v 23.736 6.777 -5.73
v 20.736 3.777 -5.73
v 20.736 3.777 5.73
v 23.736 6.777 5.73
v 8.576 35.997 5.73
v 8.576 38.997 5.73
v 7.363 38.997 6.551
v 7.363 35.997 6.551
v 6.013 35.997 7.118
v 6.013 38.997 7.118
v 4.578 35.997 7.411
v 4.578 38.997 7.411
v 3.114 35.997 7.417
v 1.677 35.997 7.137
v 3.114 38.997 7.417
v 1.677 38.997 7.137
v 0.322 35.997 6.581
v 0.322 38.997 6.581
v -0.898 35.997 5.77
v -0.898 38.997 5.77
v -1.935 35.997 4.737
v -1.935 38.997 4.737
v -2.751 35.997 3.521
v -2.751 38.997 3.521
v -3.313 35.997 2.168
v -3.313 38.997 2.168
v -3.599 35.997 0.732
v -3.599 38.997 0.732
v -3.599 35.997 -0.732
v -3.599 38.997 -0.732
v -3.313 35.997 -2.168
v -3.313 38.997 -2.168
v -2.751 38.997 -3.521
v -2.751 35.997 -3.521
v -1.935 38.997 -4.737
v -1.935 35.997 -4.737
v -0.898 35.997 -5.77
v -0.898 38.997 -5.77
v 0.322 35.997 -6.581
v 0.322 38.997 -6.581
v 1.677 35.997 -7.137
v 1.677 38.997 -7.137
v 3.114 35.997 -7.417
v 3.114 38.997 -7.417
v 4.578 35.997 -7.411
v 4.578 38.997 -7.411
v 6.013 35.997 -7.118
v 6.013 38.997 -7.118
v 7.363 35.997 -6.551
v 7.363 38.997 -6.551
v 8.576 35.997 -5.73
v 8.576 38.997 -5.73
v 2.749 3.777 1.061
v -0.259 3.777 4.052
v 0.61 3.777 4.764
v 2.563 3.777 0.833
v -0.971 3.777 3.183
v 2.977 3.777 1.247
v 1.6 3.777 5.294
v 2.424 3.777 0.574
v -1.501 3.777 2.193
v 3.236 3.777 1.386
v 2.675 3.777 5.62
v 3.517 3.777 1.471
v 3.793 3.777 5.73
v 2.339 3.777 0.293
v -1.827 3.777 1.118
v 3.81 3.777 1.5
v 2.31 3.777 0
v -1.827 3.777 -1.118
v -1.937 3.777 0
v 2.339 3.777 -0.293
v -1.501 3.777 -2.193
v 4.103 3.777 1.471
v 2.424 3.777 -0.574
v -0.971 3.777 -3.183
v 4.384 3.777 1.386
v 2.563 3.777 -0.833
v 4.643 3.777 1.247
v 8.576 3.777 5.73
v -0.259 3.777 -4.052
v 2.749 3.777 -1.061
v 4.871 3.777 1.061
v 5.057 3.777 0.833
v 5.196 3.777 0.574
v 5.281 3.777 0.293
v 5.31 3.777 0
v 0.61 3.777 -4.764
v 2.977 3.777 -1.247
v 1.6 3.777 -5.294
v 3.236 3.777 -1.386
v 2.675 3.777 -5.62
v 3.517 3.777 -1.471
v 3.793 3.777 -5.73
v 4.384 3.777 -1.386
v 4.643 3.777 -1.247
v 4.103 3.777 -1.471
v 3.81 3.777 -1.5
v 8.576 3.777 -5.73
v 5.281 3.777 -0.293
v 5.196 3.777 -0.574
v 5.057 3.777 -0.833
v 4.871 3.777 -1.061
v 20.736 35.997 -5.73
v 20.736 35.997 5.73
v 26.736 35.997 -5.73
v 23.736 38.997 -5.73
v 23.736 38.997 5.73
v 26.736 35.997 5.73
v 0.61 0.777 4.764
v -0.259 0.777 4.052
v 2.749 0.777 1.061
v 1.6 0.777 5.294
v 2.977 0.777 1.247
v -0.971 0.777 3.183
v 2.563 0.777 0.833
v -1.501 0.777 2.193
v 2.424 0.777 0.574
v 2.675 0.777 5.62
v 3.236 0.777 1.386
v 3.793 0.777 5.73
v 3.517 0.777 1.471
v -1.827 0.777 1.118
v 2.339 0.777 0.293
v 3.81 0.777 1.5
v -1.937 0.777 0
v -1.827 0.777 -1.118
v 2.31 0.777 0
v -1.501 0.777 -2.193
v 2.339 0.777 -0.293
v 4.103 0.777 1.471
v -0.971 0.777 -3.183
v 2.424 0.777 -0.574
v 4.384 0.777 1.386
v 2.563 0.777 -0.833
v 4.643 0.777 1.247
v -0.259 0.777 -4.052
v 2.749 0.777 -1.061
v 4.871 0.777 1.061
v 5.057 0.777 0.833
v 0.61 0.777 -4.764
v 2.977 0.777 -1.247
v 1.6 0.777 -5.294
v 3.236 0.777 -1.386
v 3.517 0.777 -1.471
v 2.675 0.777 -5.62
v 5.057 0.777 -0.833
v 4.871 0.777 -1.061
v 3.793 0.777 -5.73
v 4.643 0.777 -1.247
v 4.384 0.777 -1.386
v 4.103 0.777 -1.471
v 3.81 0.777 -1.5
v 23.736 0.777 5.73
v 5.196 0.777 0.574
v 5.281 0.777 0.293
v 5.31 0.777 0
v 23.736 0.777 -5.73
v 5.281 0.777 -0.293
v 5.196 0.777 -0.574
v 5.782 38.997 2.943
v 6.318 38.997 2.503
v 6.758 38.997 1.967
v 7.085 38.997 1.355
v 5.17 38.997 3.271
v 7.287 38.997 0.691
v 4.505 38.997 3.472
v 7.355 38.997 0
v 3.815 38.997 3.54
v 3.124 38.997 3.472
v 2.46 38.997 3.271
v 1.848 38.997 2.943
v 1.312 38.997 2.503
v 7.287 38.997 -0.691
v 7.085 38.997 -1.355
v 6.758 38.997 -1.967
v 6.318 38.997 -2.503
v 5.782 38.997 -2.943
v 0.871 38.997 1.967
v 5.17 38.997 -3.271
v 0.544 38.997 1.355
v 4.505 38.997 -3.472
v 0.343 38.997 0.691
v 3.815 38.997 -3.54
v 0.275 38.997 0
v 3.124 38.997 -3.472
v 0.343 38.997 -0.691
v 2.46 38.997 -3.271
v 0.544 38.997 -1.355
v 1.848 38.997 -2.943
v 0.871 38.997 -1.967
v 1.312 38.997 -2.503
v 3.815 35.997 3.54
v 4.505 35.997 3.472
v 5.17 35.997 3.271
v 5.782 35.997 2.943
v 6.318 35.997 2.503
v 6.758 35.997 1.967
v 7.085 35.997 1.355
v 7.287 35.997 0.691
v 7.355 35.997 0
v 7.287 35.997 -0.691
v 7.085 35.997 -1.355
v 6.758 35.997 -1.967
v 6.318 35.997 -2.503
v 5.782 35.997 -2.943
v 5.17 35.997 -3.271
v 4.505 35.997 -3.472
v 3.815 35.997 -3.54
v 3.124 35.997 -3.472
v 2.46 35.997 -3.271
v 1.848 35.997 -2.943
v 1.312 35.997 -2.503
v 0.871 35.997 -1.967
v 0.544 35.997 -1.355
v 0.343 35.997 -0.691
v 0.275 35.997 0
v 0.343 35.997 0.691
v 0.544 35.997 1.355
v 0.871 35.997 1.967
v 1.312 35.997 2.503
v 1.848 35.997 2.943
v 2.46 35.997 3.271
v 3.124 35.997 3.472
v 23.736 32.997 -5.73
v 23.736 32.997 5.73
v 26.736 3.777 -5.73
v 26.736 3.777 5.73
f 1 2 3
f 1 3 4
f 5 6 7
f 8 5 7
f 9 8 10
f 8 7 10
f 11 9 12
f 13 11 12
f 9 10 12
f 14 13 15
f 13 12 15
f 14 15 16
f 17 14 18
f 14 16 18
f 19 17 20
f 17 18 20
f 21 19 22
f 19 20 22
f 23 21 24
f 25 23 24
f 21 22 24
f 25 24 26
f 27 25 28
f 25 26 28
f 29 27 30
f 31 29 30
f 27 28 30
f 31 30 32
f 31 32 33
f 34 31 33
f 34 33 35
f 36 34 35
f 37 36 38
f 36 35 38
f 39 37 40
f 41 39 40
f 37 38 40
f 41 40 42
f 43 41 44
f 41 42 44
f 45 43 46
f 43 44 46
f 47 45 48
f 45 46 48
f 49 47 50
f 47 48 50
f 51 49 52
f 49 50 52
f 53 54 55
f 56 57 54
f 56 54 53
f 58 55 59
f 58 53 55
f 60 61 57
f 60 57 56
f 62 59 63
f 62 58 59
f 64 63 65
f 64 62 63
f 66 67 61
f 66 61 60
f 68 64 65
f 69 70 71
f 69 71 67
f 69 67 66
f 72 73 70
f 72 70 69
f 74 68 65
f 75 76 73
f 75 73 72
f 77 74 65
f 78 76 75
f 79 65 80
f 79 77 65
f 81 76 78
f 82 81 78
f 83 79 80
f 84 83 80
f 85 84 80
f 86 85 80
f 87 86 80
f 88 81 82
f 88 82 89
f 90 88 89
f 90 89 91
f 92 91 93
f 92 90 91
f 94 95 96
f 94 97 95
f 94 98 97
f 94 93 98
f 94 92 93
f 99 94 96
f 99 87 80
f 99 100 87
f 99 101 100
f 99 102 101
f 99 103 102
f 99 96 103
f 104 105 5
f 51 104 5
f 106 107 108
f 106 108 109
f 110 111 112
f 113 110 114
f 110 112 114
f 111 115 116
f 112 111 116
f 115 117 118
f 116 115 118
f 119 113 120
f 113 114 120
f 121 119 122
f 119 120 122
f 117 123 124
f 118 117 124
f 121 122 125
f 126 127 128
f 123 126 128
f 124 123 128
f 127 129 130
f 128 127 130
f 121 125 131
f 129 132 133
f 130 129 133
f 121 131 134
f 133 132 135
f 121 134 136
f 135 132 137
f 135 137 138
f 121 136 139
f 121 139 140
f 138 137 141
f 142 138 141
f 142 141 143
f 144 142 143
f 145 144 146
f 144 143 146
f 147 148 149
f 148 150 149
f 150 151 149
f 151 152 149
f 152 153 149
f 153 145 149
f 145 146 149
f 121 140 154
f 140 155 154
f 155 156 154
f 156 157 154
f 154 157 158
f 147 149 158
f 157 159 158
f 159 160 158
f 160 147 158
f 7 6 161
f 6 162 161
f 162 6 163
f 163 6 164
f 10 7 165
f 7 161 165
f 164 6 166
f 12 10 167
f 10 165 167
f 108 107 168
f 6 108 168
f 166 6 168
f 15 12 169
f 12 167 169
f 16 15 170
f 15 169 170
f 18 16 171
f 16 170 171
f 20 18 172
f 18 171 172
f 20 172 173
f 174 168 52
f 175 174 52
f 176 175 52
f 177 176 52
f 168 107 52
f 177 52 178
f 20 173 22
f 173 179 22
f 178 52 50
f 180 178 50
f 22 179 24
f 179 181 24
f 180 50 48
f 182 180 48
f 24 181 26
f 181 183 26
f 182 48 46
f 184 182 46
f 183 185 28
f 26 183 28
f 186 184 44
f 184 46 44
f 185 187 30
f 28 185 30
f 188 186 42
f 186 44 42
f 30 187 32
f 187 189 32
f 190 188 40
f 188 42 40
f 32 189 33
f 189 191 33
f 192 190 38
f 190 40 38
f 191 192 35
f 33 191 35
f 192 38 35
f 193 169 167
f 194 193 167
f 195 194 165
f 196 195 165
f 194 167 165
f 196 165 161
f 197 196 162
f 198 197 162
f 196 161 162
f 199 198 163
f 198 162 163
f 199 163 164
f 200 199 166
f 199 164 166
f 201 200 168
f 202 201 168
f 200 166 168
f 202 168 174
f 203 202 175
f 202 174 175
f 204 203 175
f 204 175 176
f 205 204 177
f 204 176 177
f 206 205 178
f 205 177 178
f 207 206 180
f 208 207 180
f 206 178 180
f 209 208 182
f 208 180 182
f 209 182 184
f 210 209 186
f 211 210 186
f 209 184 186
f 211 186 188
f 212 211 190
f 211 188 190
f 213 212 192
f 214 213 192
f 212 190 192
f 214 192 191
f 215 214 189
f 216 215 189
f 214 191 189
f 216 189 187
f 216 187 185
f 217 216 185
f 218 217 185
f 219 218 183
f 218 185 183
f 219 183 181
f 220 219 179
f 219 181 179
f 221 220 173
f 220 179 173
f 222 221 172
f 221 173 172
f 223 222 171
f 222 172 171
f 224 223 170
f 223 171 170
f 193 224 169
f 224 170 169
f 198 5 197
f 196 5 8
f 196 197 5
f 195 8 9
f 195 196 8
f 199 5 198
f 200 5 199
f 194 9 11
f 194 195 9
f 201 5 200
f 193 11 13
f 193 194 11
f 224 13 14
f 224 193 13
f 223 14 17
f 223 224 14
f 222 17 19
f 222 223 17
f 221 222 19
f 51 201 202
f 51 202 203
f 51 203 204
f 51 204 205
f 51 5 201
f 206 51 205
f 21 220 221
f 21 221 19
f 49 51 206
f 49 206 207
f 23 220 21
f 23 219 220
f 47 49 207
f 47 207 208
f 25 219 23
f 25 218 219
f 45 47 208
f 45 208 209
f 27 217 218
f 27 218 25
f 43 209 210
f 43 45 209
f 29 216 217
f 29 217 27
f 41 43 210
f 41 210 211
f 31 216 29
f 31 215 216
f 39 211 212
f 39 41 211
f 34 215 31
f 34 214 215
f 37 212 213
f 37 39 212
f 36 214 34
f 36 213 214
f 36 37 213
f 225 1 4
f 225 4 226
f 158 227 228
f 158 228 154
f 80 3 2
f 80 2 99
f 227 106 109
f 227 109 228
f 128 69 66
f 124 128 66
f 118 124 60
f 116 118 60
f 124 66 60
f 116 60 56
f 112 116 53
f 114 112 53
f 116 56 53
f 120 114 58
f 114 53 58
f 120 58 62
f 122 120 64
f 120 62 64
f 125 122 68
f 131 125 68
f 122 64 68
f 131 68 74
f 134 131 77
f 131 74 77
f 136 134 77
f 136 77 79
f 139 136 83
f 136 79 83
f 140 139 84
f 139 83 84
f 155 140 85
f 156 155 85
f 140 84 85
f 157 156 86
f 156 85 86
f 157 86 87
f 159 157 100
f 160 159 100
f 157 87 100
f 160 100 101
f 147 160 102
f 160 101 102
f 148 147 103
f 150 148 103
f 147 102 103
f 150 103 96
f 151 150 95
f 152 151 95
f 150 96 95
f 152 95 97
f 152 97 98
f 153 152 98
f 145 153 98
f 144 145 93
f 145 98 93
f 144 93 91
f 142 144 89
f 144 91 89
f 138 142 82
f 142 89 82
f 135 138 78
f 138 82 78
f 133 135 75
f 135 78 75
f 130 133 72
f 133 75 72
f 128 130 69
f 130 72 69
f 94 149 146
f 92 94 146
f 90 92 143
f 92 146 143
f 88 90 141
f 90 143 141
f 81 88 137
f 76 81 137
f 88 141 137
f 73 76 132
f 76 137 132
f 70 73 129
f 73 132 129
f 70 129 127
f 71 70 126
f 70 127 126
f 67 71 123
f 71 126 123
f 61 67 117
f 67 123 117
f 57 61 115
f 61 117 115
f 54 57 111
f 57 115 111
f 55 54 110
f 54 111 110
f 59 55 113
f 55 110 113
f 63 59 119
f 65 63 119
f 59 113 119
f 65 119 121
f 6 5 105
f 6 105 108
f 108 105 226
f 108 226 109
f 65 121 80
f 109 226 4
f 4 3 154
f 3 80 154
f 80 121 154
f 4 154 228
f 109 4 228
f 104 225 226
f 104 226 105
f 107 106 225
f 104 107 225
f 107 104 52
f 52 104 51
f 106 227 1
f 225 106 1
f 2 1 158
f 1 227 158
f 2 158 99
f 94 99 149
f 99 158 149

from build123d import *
from OCP.BRepAlgoAPI import BRepAlgoAPI_Cut
from OCP.TopTools import TopTools_ListOfShape

# Parameters (mm, degrees)
BOSS_EXTRUDE1_DEPTH      = 5.73
BOSS_EXTRUDE1_DEPTH_BACK = 5.73
BOSS_EXTRUDE5_DEPTH      = 11.46
BOSS_EXTRUDE8_DEPTH      = 11.46
BOSS_EXTRUDE9_DEPTH      = 3
SKETCH11_R               = 3.54
CUT_EXTRUDE1_DEPTH       = 3
BOSS_EXTRUDE10_DEPTH     = 3
SKETCH13_R               = 1.5
CUT_EXTRUDE2_DEPTH       = 3


with BuildPart() as part:
    # Sketch1 → Boss-Extrude1 (new, two sides: drawn at the far end of the back side and taken through both)
    with BuildSketch(Plane.XY.offset(-BOSS_EXTRUDE1_DEPTH_BACK)):
        Polygon((23.736099909, 38.996836219), (26.736100401, 35.996833865), (26.736100401, 3.776835326), (23.736098978, 0.776835766), (20.736098486, 3.77683812), (23.736098978, 6.776836749), (23.736098978, 32.99683803), (20.736100349, 35.996838521), align=None)
    extrude(amount=BOSS_EXTRUDE1_DEPTH + BOSS_EXTRUDE1_DEPTH_BACK)

    # Sketch6 → Boss-Extrude5 (add)
    with BuildSketch(Plane.XY.offset(5.73)):
        Polygon((20.736098486, 3.77683812), (8.576098486, 3.77683812), (8.576098486, 0.776835766), (20.736098486, 0.776835766), (23.736098978, 0.776835766), align=None)
    extrude(amount=-BOSS_EXTRUDE5_DEPTH)

    # Sketch8 → Boss-Extrude8 (add)
    with BuildSketch(Plane.XY.offset(5.73)):
        Polygon((20.736100349, 38.996836219), (23.736099909, 38.996836219), (20.736100349, 35.996838521), (8.576100349, 35.996838521), (8.576100349, 38.996836219), align=None)
    extrude(amount=-BOSS_EXTRUDE8_DEPTH)

    # Sketch9 → Boss-Extrude9 (add)
    with BuildSketch(Plane(origin=(0, 38.996836219, 0), x_dir=(1, 0, 0), z_dir=(0, 1, 0))):
        with BuildLine():
            Line((8.576100349, 5.73), (8.576100349, -5.73))
            ThreePointArc((8.576100349, -5.73), (-3.635159989, 0), (8.576100349, 5.73))
        make_face()
    extrude(amount=-BOSS_EXTRUDE9_DEPTH)

    # Sketch11 → Cut-Extrude1 (cut)
    with BuildSketch(Plane(origin=(0, 38.996836219, 0), x_dir=(1, 0, 0), z_dir=(0, 1, 0))):
        with Locations((3.814840011, 0)):
            Circle(SKETCH11_R)
    extrude(amount=-CUT_EXTRUDE1_DEPTH, mode=Mode.SUBTRACT)

    # Sketch12 → Boss-Extrude10 (add)
    with BuildSketch(Plane(origin=(0, 0.776835766, 0), x_dir=(-1, 0, 0), z_dir=(0, -1, 0))):
        with BuildLine():
            Line((-8.576098486, 5.73), (-3.793078174, 5.73))
            ThreePointArc((-3.793078174, 5.73), (1.936921826, 0), (-3.793078174, -5.73))
            Line((-3.793078174, -5.73), (-8.576098486, -5.73))
            Line((-8.576098486, -5.73), (-8.576098486, 5.73))
        make_face()
    extrude(amount=-BOSS_EXTRUDE10_DEPTH)


with BuildPart() as cut_extrude2_tool:
    # Sketch13 → Cut-Extrude2 (new body)
    with BuildSketch(Plane(origin=(0, 3.77683812, 0), x_dir=(1, 0, 0), z_dir=(0, 1, 0))):
        with Locations((3.81, 0)):
            Circle(SKETCH13_R)
    extrude(amount=-CUT_EXTRUDE2_DEPTH)


with BuildPart() as part_1:
    add(part.part)

    # Cut-Extrude2: cut by cut_extrude2_tool, with a tolerance
    cut_extrude2_stock = TopTools_ListOfShape()
    cut_extrude2_stock.Append(part_1.part.wrapped)
    cut_extrude2_tools = TopTools_ListOfShape()
    cut_extrude2_tools.Append(cut_extrude2_tool.part.wrapped)
    cut_extrude2_cut = BRepAlgoAPI_Cut()
    cut_extrude2_cut.SetArguments(cut_extrude2_stock)
    cut_extrude2_cut.SetTools(cut_extrude2_tools)
    cut_extrude2_cut.SetFuzzyValue(0.00001)
    cut_extrude2_cut.Build()
    add(Compound.cast(cut_extrude2_cut.Shape()).solids(), mode=Mode.REPLACE)


solid = part_1.part
